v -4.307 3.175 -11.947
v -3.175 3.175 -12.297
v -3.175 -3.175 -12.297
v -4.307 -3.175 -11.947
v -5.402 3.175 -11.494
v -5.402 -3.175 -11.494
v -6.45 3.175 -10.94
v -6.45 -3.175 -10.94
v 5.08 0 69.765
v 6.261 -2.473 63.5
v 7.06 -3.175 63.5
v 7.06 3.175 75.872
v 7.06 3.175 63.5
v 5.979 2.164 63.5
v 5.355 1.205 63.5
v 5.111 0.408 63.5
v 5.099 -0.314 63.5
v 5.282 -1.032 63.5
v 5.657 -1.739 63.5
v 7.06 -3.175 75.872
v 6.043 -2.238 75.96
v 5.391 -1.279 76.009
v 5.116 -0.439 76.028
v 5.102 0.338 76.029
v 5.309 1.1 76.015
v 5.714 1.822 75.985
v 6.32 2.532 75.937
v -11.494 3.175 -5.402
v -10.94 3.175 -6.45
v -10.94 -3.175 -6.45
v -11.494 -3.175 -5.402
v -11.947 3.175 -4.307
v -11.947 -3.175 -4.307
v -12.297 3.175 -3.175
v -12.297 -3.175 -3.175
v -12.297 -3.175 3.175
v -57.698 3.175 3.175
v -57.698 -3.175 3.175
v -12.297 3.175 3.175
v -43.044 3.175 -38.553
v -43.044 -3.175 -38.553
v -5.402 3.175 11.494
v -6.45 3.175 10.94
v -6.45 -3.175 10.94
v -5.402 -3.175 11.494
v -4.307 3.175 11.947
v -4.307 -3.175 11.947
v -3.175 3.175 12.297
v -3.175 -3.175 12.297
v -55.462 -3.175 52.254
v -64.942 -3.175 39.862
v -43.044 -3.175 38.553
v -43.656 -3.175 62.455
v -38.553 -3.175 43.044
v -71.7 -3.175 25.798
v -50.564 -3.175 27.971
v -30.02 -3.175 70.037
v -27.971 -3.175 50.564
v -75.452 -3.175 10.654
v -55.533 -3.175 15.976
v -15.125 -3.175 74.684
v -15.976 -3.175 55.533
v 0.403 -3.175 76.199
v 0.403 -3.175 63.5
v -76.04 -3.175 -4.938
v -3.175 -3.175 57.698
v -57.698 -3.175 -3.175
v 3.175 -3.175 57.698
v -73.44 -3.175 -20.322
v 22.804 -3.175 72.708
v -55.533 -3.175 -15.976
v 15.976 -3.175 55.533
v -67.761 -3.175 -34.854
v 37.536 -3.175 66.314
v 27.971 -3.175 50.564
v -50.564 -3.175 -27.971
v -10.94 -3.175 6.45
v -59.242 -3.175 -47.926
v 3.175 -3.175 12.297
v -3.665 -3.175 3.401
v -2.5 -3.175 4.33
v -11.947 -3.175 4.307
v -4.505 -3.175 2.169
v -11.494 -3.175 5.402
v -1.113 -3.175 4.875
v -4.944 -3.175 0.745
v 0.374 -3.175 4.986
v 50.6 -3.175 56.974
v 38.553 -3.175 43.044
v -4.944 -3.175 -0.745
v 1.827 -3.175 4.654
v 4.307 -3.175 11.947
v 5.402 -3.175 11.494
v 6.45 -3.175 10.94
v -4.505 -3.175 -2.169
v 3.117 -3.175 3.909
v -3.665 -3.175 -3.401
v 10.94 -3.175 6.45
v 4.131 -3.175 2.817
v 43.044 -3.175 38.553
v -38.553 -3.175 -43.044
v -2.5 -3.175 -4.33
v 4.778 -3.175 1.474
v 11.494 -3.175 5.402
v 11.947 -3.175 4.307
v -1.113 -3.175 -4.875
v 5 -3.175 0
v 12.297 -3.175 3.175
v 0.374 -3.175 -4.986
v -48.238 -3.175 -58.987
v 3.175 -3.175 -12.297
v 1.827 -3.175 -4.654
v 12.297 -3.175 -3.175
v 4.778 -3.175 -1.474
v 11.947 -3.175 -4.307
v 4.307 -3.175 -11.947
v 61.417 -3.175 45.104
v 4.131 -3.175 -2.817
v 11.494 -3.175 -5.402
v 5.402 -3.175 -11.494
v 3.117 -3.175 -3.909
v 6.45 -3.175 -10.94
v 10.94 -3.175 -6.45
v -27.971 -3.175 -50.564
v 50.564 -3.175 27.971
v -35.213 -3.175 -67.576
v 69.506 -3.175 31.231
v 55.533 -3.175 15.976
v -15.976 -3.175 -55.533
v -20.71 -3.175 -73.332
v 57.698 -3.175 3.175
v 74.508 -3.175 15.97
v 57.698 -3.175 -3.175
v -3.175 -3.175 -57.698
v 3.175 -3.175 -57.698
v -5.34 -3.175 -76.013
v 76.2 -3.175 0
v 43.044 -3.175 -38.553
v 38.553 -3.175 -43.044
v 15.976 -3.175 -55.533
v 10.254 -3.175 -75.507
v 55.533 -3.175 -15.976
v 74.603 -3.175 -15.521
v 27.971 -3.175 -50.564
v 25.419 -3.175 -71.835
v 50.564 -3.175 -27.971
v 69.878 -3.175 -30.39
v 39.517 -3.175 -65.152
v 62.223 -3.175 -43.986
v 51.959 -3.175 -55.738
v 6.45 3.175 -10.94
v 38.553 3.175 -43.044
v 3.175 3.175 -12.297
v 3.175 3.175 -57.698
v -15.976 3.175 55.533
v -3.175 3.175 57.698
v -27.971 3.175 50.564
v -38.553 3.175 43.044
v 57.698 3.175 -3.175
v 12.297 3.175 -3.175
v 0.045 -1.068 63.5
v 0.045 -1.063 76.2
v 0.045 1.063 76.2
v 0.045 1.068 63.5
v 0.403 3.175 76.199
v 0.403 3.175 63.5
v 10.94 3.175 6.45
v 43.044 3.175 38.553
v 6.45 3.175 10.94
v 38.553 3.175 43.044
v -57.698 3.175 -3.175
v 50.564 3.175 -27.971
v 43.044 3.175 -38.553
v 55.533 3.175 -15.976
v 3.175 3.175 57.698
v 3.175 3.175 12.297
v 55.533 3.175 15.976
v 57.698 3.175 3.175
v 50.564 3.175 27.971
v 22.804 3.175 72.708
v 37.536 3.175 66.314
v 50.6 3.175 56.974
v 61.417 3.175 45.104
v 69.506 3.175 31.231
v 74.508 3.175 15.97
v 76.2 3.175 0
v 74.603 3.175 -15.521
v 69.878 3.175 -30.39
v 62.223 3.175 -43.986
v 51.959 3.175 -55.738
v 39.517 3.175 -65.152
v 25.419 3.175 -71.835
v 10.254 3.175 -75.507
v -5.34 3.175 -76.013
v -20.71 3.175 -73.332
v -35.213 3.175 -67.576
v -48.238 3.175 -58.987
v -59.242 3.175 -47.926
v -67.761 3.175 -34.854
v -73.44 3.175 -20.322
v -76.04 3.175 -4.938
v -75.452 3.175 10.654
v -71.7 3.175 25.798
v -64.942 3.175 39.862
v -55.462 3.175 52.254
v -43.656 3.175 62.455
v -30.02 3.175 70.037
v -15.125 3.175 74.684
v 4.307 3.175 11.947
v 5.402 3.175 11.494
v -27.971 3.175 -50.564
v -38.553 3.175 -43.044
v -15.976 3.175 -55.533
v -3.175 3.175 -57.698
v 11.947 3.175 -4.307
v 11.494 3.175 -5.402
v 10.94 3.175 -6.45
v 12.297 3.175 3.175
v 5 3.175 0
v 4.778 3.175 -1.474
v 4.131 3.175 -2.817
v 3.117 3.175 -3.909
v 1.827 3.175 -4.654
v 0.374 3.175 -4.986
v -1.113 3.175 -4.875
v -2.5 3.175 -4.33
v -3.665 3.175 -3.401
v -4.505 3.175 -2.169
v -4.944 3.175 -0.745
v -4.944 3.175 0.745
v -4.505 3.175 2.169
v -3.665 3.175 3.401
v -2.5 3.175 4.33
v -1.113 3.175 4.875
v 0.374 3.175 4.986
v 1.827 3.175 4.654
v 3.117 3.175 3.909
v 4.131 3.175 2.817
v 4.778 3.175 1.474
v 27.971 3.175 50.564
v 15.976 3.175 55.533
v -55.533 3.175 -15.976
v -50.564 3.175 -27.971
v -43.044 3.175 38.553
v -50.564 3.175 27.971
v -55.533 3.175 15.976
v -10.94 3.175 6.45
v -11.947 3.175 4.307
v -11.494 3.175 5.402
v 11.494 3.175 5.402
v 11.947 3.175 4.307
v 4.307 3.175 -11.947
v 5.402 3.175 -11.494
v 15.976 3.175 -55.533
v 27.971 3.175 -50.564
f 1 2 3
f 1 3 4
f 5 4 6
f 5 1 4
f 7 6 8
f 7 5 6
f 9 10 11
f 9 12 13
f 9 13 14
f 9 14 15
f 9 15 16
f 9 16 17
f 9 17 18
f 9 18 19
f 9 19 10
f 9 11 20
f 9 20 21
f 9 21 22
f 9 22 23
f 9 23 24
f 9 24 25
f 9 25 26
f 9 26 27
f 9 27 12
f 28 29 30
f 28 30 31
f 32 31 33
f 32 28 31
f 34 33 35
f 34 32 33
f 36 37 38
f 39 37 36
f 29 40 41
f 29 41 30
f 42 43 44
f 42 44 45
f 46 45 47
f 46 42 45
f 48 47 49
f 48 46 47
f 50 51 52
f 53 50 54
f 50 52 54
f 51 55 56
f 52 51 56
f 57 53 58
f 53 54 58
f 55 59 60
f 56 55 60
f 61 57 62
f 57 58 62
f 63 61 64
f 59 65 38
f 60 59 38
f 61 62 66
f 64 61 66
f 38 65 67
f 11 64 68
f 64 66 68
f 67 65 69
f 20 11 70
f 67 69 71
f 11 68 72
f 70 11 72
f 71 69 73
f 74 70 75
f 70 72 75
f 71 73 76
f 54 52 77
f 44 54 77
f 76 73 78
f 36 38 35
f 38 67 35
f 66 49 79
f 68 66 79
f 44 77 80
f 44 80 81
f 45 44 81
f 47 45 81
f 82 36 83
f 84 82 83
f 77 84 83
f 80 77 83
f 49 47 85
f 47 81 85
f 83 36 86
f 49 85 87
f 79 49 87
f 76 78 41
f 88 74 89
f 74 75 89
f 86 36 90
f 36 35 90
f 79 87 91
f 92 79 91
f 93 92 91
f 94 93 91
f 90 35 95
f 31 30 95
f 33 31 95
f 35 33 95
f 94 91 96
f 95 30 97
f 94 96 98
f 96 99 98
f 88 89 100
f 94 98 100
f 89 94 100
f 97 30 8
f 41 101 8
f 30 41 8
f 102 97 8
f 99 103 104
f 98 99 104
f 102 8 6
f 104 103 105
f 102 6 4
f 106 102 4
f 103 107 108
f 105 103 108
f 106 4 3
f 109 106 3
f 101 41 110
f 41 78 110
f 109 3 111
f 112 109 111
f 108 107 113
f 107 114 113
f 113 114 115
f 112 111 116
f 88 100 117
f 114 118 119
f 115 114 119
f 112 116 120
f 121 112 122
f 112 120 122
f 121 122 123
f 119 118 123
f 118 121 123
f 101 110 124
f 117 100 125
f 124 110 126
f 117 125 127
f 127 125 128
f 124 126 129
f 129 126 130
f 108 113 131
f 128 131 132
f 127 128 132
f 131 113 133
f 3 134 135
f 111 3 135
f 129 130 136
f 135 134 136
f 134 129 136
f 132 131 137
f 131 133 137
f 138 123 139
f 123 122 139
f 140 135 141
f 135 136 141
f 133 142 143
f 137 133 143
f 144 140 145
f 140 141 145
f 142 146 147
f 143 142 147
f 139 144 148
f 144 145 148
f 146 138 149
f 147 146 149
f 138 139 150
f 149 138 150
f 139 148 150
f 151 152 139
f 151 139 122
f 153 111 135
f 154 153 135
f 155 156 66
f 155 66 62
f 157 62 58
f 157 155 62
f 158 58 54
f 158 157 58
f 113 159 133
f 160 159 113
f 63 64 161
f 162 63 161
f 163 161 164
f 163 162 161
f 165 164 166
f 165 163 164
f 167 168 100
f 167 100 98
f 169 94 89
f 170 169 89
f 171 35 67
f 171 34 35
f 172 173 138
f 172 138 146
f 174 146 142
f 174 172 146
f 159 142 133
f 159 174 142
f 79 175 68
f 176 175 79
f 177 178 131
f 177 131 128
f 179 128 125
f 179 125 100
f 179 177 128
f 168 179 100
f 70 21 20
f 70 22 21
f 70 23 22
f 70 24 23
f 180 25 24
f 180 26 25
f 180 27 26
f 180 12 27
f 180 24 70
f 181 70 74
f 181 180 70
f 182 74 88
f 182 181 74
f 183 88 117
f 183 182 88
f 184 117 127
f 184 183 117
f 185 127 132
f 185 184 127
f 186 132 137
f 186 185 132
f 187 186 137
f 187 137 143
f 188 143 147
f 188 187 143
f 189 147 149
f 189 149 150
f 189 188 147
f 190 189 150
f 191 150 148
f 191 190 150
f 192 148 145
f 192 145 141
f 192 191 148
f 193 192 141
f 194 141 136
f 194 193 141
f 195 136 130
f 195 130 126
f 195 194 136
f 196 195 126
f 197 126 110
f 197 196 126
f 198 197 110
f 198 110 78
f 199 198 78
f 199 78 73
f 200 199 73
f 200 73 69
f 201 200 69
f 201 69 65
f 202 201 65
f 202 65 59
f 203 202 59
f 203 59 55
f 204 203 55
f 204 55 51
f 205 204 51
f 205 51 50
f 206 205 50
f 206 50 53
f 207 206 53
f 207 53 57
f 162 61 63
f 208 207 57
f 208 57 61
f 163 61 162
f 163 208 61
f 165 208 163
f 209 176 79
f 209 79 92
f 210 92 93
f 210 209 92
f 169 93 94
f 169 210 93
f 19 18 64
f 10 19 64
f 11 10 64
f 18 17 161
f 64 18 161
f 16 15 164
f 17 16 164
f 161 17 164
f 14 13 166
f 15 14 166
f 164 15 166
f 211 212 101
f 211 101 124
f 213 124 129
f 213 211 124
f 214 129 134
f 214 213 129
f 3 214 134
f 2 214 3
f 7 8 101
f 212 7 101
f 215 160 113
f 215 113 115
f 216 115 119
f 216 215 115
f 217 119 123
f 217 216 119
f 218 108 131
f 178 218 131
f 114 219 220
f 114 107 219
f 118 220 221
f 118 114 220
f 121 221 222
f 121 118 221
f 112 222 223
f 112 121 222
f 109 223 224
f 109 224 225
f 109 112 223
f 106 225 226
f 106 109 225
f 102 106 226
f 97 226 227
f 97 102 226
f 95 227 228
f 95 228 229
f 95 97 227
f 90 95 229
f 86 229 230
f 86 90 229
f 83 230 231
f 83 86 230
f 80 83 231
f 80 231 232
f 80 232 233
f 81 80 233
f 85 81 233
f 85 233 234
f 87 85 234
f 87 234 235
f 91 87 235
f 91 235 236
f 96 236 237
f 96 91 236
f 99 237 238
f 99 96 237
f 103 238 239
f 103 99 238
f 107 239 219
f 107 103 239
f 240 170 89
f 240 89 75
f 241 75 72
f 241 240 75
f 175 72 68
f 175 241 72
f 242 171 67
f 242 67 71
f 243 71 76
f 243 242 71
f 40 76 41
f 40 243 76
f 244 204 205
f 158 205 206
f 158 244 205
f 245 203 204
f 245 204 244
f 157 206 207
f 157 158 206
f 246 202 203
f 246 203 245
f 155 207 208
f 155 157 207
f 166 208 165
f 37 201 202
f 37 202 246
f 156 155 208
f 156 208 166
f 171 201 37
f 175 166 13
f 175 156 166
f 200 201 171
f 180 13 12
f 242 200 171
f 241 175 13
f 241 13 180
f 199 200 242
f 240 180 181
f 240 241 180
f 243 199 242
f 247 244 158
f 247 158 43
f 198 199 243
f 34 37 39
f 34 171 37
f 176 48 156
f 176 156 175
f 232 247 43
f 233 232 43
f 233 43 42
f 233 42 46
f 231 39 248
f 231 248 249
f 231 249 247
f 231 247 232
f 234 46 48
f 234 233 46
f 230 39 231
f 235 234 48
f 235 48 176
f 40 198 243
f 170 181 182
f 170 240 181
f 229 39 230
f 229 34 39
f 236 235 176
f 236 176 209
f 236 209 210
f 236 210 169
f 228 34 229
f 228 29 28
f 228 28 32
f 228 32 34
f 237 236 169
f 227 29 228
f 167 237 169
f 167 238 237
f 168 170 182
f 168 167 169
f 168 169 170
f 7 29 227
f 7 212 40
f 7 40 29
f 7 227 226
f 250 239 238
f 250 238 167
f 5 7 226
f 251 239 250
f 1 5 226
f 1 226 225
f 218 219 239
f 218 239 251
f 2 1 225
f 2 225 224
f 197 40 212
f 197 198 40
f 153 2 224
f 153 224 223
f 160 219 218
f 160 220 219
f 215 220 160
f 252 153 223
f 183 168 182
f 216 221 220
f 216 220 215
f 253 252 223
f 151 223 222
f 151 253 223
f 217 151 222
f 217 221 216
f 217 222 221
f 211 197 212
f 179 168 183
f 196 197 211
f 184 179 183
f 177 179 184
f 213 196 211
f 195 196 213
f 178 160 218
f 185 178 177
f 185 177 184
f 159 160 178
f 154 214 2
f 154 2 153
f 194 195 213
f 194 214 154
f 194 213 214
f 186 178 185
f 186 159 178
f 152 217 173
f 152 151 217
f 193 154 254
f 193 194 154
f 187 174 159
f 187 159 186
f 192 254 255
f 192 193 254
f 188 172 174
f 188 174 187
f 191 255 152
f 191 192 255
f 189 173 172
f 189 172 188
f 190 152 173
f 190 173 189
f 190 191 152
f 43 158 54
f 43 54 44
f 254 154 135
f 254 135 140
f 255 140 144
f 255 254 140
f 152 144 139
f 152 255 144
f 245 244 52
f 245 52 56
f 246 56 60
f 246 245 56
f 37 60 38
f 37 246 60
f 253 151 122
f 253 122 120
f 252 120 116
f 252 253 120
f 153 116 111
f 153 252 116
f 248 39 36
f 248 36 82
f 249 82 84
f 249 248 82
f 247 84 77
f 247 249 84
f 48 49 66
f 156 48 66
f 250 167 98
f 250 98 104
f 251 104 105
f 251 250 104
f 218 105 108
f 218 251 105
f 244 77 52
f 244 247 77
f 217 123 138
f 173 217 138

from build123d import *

# Parameters (mm, degrees)
SKETCH1_R           = 76.2
SKETCH1_R_2         = 57.785
SKETCH1_R_3         = 12.7
SKETCH1_R_4         = 5
BOSS_EXTRUDE1_DEPTH = 3.175
CUT_EXTRUDE1_DEPTH  = 12.7


with BuildPart() as part:
    # Sketch1 → Boss-Extrude1 (new body, symmetric)
    with BuildSketch(Plane(origin=(0, 0, 0), x_dir=(1, 0, 0), z_dir=(0, 1, 0))):
        Circle(SKETCH1_R)
        Circle(SKETCH1_R_2, mode=Mode.SUBTRACT)
        with BuildLine():
            Line((-6.45003157, 10.940159631), (-38.553377116, 43.043505177))
            ThreePointArc((-38.553377116, 43.043505177), (-40.860165351, 40.860165351), (-43.043505177, 38.553377116))
            Line((-43.043505177, 38.553377116), (-10.940159631, 6.45003157))
            ThreePointArc((-10.940159631, 6.45003157), (-8.980256121, 8.980256121), (-6.45003157, 10.940159631))
        make_face()
        with BuildLine():
            Line((-12.296722124, 3.175), (-57.697708793, 3.175))
            ThreePointArc((-57.697708793, 3.175), (-57.785, 0), (-57.697708793, -3.175))
            Line((-57.697708793, -3.175), (-12.296722124, -3.175))
            ThreePointArc((-12.296722124, -3.175), (-12.7, 0), (-12.296722124, 3.175))
        make_face()
        with BuildLine():
            Line((-10.940159631, -6.45003157), (-43.043505177, -38.553377116))
            ThreePointArc((-43.043505177, -38.553377116), (-40.860165351, -40.860165351), (-38.553377116, -43.043505177))
            Line((-38.553377116, -43.043505177), (-6.45003157, -10.940159631))
            ThreePointArc((-6.45003157, -10.940159631), (-8.980256121, -8.980256121), (-10.940159631, -6.45003157))
        make_face()
        Circle(SKETCH1_R_3)
        Circle(SKETCH1_R_4, mode=Mode.SUBTRACT)
        with BuildLine():
            Line((-3.175, -12.296722124), (-3.175, -57.697708793))
            ThreePointArc((-3.175, -57.697708793), (0, -57.785), (3.175, -57.697708793))
            Line((3.175, -57.697708793), (3.175, -12.296722124))
            ThreePointArc((3.175, -12.296722124), (0, -12.7), (-3.175, -12.296722124))
        make_face()
        with BuildLine():
            ThreePointArc((38.553377116, -43.043505177), (40.860165351, -40.860165351), (43.043505177, -38.553377116))
            Line((43.043505177, -38.553377116), (10.940159631, -6.45003157))
            ThreePointArc((10.940159631, -6.45003157), (8.980256121, -8.980256121), (6.45003157, -10.940159631))
            Line((6.45003157, -10.940159631), (38.553377116, -43.043505177))
        make_face()
        with BuildLine():
            ThreePointArc((57.785, 0), (57.763173076, 1.588099867), (57.697708793, 3.175))
            Line((57.697708793, 3.175), (12.296722124, 3.175))
            ThreePointArc((12.296722124, 3.175), (12.598777143, 1.600254515), (12.7, 0))
            ThreePointArc((12.7, 0), (12.598777143, -1.600254515), (12.296722124, -3.175))
            Line((12.296722124, -3.175), (57.697708793, -3.175))
            ThreePointArc((57.697708793, -3.175), (57.763173076, -1.588099867), (57.785, 0))
        make_face()
        with BuildLine():
            ThreePointArc((43.043505177, 38.553377116), (40.860165351, 40.860165351), (38.553377116, 43.043505177))
            Line((38.553377116, 43.043505177), (6.45003157, 10.940159631))
            ThreePointArc((6.45003157, 10.940159631), (8.980256121, 8.980256121), (10.940159631, 6.45003157))
            Line((10.940159631, 6.45003157), (43.043505177, 38.553377116))
        make_face()
        with BuildLine():
            ThreePointArc((3.175, 57.697708793), (0, 57.785), (-3.175, 57.697708793))
            Line((-3.175, 57.697708793), (-3.175, 12.296722124))
            ThreePointArc((-3.175, 12.296722124), (0, 12.7), (3.175, 12.296722124))
            Line((3.175, 12.296722124), (3.175, 57.697708793))
        make_face()
    extrude(amount=BOSS_EXTRUDE1_DEPTH, both=True)

    # Sketch2 → Cut-Extrude1 (cut)
    with BuildSketch(Plane.XY.offset(76.2)):
        with BuildLine():
            Line((1.701477372, 6.35), (14.401477372, 6.35))
            add(Edge.make_bspline(
                [(14.401477372, 6.35), (-9.645577139, 0), (14.401477372, -6.35)],
                knots=[5.397827698, 5.397827698, 5.397827698, 7.168542916, 7.168542916, 7.168542916], degree=2, weights=[1, 0.633012702, 1]))
            Line((14.401477372, -6.35), (1.701477372, -6.35))
            ThreePointArc((1.701477372, -6.35), (0, 0), (1.701477372, 6.35))
        make_face()
    extrude(amount=-CUT_EXTRUDE1_DEPTH, mode=Mode.SUBTRACT)


solid = part.part
